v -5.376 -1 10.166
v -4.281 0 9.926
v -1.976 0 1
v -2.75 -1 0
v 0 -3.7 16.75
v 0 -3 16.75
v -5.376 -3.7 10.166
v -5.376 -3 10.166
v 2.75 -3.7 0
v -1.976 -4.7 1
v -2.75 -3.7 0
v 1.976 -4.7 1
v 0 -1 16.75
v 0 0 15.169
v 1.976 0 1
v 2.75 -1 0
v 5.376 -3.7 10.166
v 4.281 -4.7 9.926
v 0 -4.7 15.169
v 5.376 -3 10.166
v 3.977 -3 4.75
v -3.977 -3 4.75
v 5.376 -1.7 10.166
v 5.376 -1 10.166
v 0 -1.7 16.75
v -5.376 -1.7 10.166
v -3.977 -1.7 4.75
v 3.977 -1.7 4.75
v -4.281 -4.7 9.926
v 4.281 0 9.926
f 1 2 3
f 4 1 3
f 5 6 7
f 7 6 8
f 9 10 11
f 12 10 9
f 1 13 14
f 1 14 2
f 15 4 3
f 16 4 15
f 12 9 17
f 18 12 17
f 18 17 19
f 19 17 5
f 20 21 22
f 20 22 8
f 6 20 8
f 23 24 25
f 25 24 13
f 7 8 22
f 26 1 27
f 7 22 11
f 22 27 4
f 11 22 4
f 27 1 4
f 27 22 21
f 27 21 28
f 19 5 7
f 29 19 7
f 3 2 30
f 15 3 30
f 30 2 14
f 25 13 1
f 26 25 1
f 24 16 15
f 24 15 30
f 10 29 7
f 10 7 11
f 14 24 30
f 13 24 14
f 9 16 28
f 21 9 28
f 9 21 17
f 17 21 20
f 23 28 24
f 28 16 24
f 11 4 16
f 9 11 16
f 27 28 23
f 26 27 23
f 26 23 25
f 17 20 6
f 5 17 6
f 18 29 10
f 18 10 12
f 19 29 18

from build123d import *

# Parameters (mm, degrees)
F1_DEPTH = 4.7
F2_W     = 1.3
F2_H     = 12
F3_DEPTH = 10
F4_SIZE  = 1


with BuildPart() as f1:
    # F0 (on Front) → F1 (new body)
    with BuildSketch(Plane.XZ):
        Polygon((-5.37627, 10.166253), (-2.75, 0), (2.75, 0), (5.37627, 10.166253), (0, 16.75), align=None)
    extrude(amount=F1_DEPTH)

    # F2 (on Right) → F3 (cut, symmetric)
    with BuildSketch(Plane.YZ):
        with Locations((-2.35, 10.75)):
            Rectangle(F2_W, F2_H)
    extrude(amount=F3_DEPTH, both=True, mode=Mode.SUBTRACT)

    # F4
    f4_edges = [f1.edges().sort_by_distance(p)[0] for p in [
        (-4.063135, -4.7, 5.083127),
        (0, -4.7, 0),
        (4.063135, -4.7, 5.083127),
        (2.688135, -4.7, 13.458127),
        (-2.688135, -4.7, 13.458127),
        (-4.063135, 0, 5.083127),
        (0, 0, 0),
        (4.063135, 0, 5.083127),
        (2.688135, 0, 13.458127),
        (-2.688135, 0, 13.458127),
    ]]
    chamfer(f4_edges, length=F4_SIZE)


solid = f1.part
